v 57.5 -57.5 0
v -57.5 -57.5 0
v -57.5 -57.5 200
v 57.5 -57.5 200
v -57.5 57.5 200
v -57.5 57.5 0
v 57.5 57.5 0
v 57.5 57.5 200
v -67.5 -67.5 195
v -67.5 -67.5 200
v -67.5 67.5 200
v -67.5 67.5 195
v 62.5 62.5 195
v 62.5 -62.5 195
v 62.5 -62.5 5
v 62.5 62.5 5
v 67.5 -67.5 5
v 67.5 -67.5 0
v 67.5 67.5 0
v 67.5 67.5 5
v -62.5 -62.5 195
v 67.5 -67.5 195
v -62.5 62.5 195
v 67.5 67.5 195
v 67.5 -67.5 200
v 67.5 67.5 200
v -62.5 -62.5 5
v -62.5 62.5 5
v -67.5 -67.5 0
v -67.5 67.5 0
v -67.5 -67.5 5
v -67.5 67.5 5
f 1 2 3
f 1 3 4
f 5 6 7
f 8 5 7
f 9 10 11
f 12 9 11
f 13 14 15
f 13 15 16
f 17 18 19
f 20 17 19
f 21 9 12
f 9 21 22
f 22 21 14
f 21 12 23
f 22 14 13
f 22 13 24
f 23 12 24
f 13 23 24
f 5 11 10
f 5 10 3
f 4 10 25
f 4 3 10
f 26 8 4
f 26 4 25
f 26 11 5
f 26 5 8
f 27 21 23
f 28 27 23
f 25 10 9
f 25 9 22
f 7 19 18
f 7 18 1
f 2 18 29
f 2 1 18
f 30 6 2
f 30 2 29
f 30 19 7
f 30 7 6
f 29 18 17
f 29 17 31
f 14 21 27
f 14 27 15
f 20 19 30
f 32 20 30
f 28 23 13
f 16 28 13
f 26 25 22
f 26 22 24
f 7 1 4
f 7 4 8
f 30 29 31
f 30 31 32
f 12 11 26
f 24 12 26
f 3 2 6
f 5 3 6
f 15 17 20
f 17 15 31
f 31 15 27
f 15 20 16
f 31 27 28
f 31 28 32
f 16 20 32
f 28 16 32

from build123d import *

# Parameters (mm, degrees)
SKETCH2_W           = 125
SKETCH2_H           = 125
BOSS_EXTRUDE1_DEPTH = 200
SHELL1_T            = -5
SKETCH4_W           = 135
SKETCH4_H           = 135
SKETCH4_W_2         = 125
SKETCH4_H_2         = 125
BOSS_EXTRUDE2_DEPTH = 5
SKETCH3_W           = 135
SKETCH3_H           = 135
SKETCH3_W_2         = 125
SKETCH3_H_2         = 125
BOSS_EXTRUDE4_DEPTH = 5


with BuildPart() as part:
    # Sketch2 → Boss-Extrude1 (new body)
    with BuildSketch(Plane.XY):
        Rectangle(SKETCH2_W, SKETCH2_H)
    extrude(amount=BOSS_EXTRUDE1_DEPTH)

    # Shell1
    shell1_openings = [part.faces().sort_by_distance(p)[0] for p in [
        (0, 0, 200),
        (0, 0, 0),
    ]]
    offset(amount=SHELL1_T, openings=shell1_openings, kind=Kind.INTERSECTION)

    # Sketch4 → Boss-Extrude2 (add)
    with BuildSketch(Plane.XY.offset(200)):
        Rectangle(SKETCH4_W, SKETCH4_H)
        Rectangle(SKETCH4_W_2, SKETCH4_H_2, mode=Mode.SUBTRACT)
    extrude(amount=-BOSS_EXTRUDE2_DEPTH)

    # Sketch3 → Boss-Extrude4 (add)
    with BuildSketch(Plane(origin=(0, 0, 0), x_dir=(-1, 0, 0), z_dir=(0, 0, -1))):
        Rectangle(SKETCH3_W, SKETCH3_H)
        Rectangle(SKETCH3_W_2, SKETCH3_H_2, mode=Mode.SUBTRACT)
    extrude(amount=-BOSS_EXTRUDE4_DEPTH)


solid = part.part
